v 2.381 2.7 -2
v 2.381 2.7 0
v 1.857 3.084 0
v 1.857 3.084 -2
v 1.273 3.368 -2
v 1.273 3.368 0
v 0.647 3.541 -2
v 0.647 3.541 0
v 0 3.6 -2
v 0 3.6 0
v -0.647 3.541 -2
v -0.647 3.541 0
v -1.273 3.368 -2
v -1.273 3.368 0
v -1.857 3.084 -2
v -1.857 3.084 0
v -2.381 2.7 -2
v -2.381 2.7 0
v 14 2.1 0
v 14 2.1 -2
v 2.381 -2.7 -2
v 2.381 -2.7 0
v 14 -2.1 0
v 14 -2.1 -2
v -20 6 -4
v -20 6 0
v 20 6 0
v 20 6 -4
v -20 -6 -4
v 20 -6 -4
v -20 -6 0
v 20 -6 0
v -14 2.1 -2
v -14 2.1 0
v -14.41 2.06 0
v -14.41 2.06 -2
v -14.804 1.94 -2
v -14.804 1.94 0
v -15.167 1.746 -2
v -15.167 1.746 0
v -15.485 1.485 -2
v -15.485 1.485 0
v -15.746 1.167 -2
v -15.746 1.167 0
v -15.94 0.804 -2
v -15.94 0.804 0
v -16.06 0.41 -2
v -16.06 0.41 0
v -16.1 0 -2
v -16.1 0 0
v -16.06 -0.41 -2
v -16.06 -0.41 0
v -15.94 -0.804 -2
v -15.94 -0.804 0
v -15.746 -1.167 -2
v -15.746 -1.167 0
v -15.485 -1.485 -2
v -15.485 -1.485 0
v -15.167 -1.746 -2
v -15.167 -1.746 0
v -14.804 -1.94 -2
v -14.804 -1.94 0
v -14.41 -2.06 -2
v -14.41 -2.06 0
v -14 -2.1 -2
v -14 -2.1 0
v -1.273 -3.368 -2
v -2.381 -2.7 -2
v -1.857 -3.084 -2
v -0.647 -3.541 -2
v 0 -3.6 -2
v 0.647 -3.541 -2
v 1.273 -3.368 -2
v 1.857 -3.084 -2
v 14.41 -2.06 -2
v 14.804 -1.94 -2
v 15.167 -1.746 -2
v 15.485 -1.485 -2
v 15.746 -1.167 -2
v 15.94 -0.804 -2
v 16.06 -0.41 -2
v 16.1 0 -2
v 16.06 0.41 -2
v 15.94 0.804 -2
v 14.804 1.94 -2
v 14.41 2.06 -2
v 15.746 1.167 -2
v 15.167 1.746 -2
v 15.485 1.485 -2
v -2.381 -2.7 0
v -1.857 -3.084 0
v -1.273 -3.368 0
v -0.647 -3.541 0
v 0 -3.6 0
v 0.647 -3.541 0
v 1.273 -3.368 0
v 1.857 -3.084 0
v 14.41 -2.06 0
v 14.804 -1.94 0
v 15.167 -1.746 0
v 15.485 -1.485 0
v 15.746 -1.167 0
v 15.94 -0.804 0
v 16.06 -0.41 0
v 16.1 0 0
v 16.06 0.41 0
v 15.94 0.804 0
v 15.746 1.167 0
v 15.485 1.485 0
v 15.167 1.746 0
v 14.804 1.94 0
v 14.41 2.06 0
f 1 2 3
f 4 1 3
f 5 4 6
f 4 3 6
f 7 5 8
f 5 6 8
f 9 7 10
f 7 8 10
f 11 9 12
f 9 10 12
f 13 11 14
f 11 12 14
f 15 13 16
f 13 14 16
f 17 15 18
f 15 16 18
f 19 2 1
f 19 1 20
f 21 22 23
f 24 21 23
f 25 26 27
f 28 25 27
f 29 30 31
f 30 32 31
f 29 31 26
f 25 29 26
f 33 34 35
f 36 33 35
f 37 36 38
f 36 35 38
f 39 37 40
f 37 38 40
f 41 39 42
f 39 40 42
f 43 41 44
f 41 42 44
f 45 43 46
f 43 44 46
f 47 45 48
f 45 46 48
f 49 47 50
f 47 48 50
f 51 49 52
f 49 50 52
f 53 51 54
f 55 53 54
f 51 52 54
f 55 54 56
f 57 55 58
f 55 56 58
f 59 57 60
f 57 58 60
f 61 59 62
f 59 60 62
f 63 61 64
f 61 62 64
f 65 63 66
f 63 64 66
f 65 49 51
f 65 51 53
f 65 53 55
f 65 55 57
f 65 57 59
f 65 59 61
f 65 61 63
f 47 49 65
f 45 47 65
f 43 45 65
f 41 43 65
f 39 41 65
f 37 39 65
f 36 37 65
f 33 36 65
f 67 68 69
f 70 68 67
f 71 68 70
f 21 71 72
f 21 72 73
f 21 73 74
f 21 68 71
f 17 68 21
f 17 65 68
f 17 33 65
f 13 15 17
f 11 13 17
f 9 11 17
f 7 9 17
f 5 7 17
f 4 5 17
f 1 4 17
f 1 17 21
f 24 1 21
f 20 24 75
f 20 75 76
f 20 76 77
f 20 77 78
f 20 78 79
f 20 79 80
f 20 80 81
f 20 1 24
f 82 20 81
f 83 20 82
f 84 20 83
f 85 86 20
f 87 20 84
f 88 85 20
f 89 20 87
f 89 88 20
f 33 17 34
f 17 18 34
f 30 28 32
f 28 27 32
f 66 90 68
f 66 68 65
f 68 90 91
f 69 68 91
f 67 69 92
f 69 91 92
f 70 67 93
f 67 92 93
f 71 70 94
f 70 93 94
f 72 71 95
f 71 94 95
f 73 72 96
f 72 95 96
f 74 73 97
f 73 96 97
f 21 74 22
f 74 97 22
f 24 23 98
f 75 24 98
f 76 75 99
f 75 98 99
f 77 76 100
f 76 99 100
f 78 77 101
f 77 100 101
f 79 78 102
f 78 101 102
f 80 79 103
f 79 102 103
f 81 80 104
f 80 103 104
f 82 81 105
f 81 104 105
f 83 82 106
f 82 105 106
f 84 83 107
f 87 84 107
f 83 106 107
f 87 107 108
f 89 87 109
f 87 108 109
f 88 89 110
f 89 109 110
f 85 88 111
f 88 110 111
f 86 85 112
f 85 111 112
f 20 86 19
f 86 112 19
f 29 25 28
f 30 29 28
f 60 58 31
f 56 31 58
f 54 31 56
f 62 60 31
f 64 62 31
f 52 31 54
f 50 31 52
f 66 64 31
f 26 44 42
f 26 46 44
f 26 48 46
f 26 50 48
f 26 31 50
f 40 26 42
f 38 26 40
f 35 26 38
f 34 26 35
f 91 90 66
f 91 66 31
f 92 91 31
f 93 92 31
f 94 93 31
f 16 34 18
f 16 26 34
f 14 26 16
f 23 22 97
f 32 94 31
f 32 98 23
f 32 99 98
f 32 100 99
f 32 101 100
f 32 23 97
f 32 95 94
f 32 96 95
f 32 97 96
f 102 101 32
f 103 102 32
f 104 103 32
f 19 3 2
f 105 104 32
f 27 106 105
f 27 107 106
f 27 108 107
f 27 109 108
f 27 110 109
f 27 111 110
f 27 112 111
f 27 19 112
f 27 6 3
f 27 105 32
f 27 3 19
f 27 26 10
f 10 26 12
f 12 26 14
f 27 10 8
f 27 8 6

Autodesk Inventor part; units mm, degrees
ref_plane "YZ Plane" through (0, 0, 0) normal (1, 0, 0) x (0, 1, 0)
ref_plane "XZ Plane" through (0, 0, 0) normal (0, 1, 0) x (-1, 0, 0)
ref_plane "XY Plane" through (0, 0, 0) normal (0, 0, 1) x (1, 0, 0)
sketch "Sketch2" plane through (0, 0, 0) normal (0, 0, 1) x (1, 0, 0)
  line L0 (-20, 6) -> (20, 6)
  line L1 (20, 6) -> (20, -6)
  line L2 (20, -6) -> (-20, -6)
  line L3 (-20, -6) -> (-20, 6)
  line L4 (-20, 6) -> (20, -6) construction
  line L5 (20, 6) -> (-20, -6) construction
  point P0 (0, 0)
  dimension "d0" = 40
  dimension "d1" = 12
extrude "Extrusion1" add sketch "Sketch2" against normal blind 4
sketch "Sketch3" plane through (0, 0, 0) normal (0, 0, 1) x (1, 0, 0)
  line L0 (0, 0) -> (16.1, 0) construction
  line L1 (0, 0) -> (16.1, 0) construction
  arc A0 (14, -2.1) -> (14, 2.1) centre (14, 0) ccw
  line L2 (2.3812, 0) -> (2.3812, 2.7) construction
  line L3 (2.3812, 2.7) -> (14, 2.1)
  line L4 (2.3812, -2.7) -> (14, -2.1)
  line L5 (0, 0) -> (0, 3.6) construction
  arc A1 (-14, 2.1) -> (-14, -2.1) centre (-14, 0) ccw
  line L6 (-2.3812, 2.7) -> (-14, 2.1)
  line L7 (-2.3812, -2.7) -> (-14, -2.1)
  arc A2 (2.3812, 2.7) -> (-2.3812, 2.7) centre (0, 0) ccw
  arc A3 (-2.3812, -2.7) -> (2.3812, -2.7) centre (0, 0) ccw
  dimension "d10" = 16.1
  dimension "d12" = 2.7
extrude "Extrusion3" cut sketch "Sketch3" against normal blind 2
properties part number "micro_horn_test"
